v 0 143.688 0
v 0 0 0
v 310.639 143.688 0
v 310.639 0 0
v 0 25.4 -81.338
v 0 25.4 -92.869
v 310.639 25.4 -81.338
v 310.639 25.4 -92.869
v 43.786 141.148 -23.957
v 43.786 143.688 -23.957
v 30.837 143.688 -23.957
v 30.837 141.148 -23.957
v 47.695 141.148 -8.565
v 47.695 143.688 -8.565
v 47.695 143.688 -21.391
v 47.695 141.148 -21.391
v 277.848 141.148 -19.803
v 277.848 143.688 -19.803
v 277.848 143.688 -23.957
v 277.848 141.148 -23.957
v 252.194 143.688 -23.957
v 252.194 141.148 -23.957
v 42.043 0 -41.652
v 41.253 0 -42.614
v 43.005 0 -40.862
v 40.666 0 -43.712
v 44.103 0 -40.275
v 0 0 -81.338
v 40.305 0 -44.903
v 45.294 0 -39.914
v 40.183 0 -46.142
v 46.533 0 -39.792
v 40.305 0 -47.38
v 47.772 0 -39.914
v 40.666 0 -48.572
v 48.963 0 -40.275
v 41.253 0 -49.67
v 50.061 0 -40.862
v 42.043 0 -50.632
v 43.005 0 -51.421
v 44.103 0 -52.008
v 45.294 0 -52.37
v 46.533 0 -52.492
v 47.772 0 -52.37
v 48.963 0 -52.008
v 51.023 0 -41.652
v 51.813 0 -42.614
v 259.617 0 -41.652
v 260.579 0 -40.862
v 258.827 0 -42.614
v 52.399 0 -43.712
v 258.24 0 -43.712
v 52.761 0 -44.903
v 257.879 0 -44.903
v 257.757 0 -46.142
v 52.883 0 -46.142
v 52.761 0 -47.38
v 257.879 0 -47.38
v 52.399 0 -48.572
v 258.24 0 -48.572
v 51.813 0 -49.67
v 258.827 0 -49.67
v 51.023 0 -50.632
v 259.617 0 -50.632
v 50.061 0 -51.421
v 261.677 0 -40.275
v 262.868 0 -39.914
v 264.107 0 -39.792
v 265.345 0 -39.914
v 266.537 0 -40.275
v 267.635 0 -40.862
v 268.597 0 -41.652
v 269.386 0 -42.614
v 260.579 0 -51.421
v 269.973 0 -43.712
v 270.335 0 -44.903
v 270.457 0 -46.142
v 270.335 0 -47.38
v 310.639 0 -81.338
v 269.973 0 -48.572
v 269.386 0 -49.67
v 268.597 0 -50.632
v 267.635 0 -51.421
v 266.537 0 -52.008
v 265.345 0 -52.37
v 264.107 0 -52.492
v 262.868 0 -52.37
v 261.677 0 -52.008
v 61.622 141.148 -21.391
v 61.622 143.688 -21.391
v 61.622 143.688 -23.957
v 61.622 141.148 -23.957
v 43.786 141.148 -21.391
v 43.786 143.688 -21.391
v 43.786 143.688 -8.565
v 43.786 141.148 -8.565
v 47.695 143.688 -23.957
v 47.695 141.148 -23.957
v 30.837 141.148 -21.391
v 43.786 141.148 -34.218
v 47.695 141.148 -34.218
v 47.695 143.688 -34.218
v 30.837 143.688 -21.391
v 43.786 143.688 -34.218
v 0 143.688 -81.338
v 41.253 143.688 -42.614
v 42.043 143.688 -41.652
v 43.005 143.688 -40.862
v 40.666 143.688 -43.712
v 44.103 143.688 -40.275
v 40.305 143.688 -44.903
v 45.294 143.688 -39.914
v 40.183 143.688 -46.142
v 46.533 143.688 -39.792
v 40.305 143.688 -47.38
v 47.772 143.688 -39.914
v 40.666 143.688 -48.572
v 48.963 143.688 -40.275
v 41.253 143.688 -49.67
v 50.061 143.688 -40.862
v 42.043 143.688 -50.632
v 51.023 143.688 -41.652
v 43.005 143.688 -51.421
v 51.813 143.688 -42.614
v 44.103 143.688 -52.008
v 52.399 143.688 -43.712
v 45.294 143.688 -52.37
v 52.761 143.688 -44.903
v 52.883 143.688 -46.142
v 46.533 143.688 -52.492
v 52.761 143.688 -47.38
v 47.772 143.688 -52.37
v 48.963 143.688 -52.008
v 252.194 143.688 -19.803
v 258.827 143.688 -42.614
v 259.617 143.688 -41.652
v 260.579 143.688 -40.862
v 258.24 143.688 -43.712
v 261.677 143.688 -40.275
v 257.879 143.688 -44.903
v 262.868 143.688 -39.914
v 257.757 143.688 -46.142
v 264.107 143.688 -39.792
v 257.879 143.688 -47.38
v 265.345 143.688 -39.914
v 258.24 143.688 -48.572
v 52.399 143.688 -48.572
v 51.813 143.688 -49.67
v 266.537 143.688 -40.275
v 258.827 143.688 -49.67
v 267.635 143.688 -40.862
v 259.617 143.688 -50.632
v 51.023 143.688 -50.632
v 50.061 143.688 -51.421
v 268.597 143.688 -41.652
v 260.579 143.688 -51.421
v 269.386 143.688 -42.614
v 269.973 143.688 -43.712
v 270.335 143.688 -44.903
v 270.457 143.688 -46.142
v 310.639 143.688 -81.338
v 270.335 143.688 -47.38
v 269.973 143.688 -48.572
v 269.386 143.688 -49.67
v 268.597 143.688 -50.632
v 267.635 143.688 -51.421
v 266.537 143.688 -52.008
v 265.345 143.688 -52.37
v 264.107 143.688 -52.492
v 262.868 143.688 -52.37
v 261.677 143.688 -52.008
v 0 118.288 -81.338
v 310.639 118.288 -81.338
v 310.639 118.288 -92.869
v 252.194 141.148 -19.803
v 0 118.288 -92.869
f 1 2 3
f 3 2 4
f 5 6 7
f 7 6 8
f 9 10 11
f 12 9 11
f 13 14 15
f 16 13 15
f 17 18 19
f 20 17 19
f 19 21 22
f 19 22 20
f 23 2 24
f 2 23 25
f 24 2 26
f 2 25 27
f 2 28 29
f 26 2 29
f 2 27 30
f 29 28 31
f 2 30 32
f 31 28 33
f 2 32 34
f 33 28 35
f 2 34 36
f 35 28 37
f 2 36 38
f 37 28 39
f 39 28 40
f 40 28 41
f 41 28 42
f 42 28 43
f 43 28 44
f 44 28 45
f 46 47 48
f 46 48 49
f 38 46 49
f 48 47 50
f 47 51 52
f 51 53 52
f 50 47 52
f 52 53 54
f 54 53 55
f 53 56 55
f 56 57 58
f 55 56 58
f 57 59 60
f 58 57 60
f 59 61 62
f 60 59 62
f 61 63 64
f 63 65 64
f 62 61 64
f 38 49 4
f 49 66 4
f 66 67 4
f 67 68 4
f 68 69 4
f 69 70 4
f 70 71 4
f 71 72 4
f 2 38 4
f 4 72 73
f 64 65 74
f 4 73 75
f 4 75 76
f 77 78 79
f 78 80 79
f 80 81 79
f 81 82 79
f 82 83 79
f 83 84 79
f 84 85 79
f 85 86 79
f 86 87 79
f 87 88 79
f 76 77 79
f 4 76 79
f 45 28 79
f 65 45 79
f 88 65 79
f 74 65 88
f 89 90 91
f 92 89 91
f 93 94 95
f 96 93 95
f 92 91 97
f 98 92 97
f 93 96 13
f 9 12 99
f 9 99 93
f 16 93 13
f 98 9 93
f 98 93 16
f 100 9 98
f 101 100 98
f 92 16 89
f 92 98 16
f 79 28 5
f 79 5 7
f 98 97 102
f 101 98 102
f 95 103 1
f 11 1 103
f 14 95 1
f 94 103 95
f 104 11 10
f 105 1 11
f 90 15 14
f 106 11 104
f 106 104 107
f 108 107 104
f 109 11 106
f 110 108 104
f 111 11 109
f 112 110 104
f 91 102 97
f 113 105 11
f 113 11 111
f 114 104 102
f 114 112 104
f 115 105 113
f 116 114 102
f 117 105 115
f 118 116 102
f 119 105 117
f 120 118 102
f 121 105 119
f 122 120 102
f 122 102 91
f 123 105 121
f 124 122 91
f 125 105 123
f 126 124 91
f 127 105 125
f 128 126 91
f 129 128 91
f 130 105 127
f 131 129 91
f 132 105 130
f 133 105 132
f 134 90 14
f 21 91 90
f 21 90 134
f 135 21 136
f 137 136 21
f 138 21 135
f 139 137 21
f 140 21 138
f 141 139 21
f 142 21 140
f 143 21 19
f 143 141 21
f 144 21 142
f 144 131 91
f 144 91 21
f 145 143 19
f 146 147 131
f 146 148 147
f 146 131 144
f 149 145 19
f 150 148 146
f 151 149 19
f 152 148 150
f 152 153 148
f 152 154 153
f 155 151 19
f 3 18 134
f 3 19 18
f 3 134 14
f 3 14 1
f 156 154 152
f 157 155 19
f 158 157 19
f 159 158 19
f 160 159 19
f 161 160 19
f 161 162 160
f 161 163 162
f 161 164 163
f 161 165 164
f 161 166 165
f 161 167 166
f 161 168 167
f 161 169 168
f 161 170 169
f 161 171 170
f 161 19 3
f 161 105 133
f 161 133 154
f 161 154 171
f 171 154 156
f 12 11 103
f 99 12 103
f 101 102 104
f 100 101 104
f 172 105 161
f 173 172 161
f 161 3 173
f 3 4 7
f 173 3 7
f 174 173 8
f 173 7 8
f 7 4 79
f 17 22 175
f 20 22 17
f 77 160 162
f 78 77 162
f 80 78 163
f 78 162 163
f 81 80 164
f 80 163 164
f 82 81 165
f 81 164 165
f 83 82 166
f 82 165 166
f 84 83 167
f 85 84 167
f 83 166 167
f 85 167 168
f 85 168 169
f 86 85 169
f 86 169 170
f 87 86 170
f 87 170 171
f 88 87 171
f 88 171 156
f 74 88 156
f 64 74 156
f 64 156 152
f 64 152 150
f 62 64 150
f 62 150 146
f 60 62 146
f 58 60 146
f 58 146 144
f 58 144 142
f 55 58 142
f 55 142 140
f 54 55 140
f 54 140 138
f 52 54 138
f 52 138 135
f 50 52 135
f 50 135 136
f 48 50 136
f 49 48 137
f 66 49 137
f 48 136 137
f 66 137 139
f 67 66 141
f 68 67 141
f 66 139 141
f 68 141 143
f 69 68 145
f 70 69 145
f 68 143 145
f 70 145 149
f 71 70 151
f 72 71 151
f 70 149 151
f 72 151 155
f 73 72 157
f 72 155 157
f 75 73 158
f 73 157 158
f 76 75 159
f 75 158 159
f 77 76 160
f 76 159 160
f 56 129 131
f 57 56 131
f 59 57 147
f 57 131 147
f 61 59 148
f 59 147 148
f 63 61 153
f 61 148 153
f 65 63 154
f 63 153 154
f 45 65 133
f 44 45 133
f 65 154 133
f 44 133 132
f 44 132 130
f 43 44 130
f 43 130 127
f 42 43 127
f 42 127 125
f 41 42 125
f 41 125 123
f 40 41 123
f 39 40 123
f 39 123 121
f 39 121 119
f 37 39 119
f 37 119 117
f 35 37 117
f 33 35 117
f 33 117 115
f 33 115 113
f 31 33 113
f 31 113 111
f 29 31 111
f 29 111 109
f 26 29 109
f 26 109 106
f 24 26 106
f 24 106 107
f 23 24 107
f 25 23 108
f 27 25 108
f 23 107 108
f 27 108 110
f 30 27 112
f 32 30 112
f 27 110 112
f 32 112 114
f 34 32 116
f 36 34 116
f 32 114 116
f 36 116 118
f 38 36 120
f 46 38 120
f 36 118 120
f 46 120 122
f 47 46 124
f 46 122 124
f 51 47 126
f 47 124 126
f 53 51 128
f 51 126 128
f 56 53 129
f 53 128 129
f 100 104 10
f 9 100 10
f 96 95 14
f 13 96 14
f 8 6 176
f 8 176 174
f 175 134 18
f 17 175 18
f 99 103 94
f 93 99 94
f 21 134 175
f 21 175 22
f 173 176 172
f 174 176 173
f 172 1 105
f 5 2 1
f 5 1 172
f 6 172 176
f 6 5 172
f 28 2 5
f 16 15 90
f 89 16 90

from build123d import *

# Parameters (mm, degrees)
SKETCH1_W           = 310.63946
SKETCH1_H           = 92.869200088
BOSS_EXTRUDE1_DEPTH = 143.6878
SKETCH2_R           = 6.35
CUT_EXTRUDE1_DEPTH  = 144.6878
SKETCH3_W           = 310.82742
SKETCH3_H           = 12.7
CUT_EXTRUDE2_DEPTH  = 25.4
SKETCH4_W           = 25.653918198
SKETCH4_H           = 4.153491518
CUT_EXTRUDE3_DEPTH  = 2.54


with BuildPart() as part:
    # Sketch1 → Boss-Extrude1 (new body)
    with BuildSketch(Plane(origin=(0, 0, 0), x_dir=(1, 0, 0), z_dir=(0, 1, 0))):
        with Locations((155.31973, 46.434600044)):
            Rectangle(SKETCH1_W, SKETCH1_H)
    extrude(amount=BOSS_EXTRUDE1_DEPTH)

    # Sketch2 → Cut-Extrude1 (cut, through all)
    with BuildSketch(Plane(origin=(0, 143.6878, 0), x_dir=(1, 0, 0), z_dir=(0, 1, 0))):
        with Locations((46.5328, 46.14164)):
            Circle(SKETCH2_R)
        with Locations((264.10666, 46.14164)):
            Circle(SKETCH2_R)
    extrude(amount=-CUT_EXTRUDE1_DEPTH, mode=Mode.SUBTRACT)

    # Sketch3 → Cut-Extrude2 (cut)
    with BuildSketch(Plane(origin=(0, 143.6878, 0), x_dir=(1, 0, 0), z_dir=(0, 1, 0))):
        with Locations((155.41371, 87.68842)):
            Rectangle(SKETCH3_W, SKETCH3_H)
    cut_extrude2 = extrude(amount=-CUT_EXTRUDE2_DEPTH, mode=Mode.SUBTRACT)

    # Mirror1: Cut-Extrude2 across plane
    add(cut_extrude2.mirror(Plane.ZX.offset(71.8439)), mode=Mode.SUBTRACT)

    # Sketch4 → Cut-Extrude3 (cut)
    with BuildSketch(Plane(origin=(0, 143.6878, 0), x_dir=(1, 0, 0), z_dir=(0, 1, 0))):
        Polygon((43.786266597, 21.391489422), (43.786266597, 8.564530323), (47.695435084, 8.564530323), (47.695435084, 21.391489422), (61.62184782, 21.391489422), (61.62184782, 23.956881242), (47.695435084, 23.956881242), (47.695435084, 34.218448521), (43.786266597, 34.218448521), (43.786266597, 23.956881242), (30.837145982, 23.956881242), (30.837145982, 21.391489422), align=None)
        with Locations((265.020770675, 21.880135483)):
            Rectangle(SKETCH4_W, SKETCH4_H)
    extrude(amount=-CUT_EXTRUDE3_DEPTH, mode=Mode.SUBTRACT)


solid = part.part
